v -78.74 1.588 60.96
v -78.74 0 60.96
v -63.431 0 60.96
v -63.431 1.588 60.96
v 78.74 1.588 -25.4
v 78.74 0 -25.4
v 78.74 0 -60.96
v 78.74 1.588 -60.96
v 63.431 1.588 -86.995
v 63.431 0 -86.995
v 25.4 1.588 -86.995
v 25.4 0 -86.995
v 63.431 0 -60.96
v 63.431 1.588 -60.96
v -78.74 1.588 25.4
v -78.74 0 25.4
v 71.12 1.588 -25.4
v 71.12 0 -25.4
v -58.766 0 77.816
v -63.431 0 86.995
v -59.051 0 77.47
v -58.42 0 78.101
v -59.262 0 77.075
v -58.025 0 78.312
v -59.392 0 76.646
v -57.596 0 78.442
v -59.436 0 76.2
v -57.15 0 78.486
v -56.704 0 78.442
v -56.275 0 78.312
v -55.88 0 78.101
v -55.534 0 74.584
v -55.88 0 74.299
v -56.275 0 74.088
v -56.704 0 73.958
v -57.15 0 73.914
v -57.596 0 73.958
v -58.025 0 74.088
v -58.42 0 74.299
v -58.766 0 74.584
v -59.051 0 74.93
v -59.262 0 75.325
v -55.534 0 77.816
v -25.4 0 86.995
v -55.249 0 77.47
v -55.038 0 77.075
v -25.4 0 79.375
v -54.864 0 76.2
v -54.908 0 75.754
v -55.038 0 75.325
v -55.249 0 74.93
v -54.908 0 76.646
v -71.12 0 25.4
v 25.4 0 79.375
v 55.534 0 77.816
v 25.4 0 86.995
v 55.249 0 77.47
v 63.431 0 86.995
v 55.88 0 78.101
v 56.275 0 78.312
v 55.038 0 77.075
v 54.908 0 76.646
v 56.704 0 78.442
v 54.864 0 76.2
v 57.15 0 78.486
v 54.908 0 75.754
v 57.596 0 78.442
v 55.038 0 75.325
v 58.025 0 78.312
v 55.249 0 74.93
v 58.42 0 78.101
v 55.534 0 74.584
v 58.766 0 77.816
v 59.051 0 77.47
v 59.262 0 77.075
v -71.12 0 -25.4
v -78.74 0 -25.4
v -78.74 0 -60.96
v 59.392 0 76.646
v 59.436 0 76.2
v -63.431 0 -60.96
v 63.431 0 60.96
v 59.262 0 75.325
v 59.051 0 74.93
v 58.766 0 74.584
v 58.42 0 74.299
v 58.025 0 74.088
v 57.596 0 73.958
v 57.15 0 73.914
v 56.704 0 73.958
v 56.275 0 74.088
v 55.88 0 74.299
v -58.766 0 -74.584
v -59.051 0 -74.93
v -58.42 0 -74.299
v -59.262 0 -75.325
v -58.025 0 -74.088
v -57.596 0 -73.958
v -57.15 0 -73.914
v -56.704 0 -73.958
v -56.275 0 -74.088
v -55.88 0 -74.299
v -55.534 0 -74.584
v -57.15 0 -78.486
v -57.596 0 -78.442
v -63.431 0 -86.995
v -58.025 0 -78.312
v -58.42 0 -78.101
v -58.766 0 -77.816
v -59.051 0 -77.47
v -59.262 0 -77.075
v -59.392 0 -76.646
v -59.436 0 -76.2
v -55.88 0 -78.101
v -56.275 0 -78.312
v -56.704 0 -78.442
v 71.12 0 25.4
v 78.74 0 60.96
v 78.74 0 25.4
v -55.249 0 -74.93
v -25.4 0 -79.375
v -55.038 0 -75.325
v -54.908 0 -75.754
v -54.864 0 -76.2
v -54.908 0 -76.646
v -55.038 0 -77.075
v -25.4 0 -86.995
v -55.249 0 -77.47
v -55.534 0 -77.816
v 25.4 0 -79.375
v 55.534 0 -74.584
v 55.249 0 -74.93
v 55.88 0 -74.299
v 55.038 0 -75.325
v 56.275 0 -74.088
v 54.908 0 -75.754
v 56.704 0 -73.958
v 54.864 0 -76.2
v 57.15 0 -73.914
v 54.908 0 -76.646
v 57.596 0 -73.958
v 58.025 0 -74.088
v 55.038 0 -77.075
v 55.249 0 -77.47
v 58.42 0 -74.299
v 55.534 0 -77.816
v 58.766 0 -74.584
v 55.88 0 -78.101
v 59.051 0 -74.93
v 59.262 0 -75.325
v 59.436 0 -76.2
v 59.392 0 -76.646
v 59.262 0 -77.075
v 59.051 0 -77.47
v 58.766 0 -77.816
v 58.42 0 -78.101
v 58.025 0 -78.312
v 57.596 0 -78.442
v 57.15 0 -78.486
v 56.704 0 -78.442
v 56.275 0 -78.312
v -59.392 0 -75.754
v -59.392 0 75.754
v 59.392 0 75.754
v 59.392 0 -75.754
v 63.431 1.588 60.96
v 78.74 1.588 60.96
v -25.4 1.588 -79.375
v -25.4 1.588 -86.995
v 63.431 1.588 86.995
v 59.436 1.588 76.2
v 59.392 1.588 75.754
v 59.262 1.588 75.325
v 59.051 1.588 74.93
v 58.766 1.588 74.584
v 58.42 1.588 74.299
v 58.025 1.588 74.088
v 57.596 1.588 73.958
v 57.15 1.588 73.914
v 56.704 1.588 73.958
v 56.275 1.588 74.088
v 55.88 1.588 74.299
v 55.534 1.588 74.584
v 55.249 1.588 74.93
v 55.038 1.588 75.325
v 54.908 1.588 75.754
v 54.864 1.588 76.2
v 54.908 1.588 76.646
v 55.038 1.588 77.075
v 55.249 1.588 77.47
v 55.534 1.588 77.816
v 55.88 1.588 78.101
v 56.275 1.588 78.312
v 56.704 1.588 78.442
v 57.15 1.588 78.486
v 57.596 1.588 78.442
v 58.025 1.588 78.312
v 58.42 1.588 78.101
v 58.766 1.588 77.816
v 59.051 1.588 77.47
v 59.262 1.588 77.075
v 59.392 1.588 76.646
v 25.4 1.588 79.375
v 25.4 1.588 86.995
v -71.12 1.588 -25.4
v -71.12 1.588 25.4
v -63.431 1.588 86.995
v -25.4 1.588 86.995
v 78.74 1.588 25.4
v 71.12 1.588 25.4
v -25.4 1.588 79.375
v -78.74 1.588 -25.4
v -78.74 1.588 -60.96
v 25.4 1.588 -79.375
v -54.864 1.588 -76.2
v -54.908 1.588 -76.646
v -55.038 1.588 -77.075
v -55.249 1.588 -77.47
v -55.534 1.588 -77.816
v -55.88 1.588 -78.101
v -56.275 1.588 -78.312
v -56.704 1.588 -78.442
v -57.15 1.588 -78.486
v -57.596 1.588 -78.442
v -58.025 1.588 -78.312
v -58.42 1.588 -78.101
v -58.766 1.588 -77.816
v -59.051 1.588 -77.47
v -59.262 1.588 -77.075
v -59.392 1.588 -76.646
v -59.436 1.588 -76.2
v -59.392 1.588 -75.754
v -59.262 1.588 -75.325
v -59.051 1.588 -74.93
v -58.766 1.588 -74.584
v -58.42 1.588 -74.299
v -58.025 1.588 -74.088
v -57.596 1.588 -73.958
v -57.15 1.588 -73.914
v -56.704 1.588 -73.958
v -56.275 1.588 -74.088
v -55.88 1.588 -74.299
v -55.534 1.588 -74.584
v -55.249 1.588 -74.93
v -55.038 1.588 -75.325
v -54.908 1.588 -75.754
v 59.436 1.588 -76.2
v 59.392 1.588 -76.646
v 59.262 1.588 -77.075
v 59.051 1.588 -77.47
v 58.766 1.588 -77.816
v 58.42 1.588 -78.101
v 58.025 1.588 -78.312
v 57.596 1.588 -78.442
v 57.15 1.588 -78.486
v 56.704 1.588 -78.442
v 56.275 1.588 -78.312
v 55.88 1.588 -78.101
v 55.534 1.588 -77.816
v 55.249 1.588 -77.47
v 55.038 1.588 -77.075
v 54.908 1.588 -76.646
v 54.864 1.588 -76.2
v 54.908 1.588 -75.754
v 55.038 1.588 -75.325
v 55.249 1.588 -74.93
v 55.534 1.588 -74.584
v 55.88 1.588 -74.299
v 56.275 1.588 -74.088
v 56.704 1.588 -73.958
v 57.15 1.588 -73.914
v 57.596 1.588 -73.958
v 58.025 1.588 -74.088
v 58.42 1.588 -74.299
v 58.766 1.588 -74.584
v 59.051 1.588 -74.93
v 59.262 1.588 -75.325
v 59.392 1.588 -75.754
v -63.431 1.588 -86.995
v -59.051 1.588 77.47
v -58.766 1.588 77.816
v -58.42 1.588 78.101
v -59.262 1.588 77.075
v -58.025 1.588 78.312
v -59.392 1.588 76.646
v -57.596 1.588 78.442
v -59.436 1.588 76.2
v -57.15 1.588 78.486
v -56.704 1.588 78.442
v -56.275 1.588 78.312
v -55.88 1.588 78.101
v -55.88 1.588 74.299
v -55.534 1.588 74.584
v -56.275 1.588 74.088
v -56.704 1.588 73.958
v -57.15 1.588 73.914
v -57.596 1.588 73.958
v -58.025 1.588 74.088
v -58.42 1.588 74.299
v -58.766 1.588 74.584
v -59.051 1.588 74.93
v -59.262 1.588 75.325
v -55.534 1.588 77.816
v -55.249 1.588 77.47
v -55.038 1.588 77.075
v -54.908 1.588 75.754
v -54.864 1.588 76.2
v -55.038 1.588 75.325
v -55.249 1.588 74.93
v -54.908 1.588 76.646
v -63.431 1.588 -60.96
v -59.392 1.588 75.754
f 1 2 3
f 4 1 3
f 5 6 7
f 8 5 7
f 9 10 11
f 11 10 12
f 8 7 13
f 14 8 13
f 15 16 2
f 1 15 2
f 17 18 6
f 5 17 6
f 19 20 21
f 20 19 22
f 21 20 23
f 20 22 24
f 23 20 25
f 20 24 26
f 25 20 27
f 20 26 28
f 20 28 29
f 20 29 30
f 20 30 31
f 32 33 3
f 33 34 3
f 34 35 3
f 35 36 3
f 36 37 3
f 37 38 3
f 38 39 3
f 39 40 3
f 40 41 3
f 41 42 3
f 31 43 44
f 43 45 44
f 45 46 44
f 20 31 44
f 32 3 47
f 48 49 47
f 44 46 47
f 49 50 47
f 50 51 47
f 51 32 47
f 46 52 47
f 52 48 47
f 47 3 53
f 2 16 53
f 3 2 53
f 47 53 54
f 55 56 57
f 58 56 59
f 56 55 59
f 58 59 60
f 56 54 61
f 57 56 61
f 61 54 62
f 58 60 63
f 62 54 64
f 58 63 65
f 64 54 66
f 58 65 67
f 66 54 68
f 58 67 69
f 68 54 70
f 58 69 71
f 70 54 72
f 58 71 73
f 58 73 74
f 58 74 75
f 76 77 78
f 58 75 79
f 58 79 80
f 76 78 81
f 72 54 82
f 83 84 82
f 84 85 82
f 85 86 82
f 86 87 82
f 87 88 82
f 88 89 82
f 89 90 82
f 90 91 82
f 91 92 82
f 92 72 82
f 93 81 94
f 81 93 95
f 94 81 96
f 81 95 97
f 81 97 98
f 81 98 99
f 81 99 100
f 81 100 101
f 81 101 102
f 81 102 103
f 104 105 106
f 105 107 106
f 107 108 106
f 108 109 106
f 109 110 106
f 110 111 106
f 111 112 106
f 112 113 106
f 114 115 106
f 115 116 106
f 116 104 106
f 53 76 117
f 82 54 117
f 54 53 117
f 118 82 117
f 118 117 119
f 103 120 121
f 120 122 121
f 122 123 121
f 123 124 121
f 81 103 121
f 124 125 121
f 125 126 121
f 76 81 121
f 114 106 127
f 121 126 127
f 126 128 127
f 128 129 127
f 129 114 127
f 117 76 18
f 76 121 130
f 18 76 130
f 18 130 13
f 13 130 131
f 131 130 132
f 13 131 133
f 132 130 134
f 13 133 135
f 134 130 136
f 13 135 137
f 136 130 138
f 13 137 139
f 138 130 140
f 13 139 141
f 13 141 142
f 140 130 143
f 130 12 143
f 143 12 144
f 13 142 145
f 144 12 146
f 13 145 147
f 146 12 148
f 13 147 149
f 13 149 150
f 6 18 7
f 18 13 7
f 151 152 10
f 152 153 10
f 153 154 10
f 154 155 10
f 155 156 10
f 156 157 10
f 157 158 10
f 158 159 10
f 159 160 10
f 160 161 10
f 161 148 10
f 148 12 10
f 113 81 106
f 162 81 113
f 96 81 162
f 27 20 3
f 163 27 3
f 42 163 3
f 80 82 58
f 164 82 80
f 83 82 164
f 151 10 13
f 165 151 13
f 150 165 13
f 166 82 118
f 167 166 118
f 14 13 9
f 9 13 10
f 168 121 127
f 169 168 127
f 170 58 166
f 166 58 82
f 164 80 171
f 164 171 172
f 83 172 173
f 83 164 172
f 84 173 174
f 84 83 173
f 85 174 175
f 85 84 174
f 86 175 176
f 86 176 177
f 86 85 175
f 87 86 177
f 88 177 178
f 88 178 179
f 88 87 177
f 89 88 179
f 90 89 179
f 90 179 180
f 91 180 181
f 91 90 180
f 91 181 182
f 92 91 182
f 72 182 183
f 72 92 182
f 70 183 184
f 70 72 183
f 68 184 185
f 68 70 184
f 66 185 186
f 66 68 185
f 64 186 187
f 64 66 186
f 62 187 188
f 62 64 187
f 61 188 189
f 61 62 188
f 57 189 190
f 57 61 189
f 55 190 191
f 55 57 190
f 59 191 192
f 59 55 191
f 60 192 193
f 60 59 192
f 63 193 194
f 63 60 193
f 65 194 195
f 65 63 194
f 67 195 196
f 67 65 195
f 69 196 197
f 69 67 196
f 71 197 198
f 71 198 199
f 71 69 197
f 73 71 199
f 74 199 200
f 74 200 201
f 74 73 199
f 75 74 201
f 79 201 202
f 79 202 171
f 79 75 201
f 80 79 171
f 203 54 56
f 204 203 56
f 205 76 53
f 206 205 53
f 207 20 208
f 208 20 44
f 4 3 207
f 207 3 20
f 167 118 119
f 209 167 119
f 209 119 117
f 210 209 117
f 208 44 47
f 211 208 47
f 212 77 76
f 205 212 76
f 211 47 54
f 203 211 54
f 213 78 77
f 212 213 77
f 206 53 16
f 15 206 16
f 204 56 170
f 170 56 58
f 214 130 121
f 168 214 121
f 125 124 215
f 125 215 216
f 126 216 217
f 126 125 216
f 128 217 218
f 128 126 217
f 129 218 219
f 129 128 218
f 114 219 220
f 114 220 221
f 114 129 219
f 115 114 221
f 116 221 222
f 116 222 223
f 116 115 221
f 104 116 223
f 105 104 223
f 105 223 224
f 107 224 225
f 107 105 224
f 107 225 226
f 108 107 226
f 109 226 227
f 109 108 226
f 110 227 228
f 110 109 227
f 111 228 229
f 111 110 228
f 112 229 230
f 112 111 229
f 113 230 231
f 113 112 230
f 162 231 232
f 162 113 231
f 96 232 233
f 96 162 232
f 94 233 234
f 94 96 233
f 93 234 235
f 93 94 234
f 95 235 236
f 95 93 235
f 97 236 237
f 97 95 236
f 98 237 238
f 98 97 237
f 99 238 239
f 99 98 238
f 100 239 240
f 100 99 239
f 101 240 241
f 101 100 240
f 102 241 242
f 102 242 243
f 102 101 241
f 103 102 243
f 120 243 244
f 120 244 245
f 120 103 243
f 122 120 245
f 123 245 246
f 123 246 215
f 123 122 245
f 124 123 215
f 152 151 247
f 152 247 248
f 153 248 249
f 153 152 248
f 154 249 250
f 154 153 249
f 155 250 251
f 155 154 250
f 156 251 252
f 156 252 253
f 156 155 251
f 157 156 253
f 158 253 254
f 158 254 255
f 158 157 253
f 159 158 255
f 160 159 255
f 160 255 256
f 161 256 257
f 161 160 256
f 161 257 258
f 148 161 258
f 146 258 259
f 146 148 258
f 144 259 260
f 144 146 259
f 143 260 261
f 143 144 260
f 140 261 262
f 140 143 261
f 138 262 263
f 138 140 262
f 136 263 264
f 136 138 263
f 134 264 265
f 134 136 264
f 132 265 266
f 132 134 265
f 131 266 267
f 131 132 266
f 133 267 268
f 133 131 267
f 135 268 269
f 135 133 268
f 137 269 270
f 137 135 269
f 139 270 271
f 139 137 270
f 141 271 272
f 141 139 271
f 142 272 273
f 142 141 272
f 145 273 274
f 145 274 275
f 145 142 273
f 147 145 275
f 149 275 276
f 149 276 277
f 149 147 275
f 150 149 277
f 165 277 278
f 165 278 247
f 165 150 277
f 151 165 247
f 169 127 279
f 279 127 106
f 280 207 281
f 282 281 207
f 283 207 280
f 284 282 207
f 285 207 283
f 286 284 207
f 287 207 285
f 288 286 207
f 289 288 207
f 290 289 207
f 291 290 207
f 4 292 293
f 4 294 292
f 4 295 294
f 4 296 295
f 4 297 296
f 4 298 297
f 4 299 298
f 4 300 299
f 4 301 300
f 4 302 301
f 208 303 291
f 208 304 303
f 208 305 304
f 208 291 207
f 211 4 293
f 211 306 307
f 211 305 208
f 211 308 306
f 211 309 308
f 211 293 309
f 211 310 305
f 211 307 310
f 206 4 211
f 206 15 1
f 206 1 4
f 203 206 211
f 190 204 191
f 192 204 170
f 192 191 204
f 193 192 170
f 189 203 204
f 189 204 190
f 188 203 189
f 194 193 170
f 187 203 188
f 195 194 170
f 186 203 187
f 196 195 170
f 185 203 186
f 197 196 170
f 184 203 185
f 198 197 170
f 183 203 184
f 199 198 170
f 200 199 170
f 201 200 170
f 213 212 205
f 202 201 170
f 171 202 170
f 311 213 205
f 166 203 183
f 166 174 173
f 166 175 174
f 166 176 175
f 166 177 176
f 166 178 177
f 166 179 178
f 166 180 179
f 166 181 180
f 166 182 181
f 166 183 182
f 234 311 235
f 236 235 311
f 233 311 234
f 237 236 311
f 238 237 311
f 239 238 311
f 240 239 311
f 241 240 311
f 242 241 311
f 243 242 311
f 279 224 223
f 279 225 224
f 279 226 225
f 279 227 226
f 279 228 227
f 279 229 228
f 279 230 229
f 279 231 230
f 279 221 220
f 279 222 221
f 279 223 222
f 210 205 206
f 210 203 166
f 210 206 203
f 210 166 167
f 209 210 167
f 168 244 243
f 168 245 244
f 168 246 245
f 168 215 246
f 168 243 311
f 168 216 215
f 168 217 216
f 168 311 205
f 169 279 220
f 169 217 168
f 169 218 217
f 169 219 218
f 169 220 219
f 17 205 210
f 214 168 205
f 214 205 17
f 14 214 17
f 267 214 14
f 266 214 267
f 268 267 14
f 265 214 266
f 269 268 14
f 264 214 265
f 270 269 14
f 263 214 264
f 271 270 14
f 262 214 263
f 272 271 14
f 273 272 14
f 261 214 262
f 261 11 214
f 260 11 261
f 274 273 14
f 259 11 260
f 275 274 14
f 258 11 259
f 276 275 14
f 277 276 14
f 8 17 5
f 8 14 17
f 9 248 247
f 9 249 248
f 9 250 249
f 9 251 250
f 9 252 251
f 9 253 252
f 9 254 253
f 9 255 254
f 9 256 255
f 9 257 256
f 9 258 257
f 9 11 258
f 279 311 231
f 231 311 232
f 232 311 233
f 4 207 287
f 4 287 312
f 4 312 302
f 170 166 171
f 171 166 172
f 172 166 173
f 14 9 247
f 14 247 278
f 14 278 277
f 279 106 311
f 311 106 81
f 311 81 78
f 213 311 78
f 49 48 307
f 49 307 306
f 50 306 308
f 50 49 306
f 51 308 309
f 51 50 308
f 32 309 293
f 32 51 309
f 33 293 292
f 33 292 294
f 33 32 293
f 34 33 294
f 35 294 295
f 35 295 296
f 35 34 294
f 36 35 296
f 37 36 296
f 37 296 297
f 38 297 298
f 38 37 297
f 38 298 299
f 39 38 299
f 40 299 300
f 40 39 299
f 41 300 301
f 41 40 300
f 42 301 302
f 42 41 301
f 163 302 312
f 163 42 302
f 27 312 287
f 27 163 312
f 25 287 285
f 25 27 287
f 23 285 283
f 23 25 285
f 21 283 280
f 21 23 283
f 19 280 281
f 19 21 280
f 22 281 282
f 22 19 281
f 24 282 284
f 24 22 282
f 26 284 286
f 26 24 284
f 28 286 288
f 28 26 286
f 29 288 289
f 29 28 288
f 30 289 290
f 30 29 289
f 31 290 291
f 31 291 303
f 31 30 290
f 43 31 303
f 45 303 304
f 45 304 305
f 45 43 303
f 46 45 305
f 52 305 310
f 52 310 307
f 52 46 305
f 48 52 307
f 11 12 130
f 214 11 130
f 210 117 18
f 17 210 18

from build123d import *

# Parameters (mm, degrees)
SKETCH1_R       = 2.286
MAIN_BODY_DEPTH = 1.5875


with BuildPart() as part:
    # Sketch1 → Main Body (new body)
    with BuildSketch(Plane(origin=(0, 0, 0), x_dir=(1, 0, 0), z_dir=(0, 1, 0))):
        Polygon((-25.4, 86.995), (-63.43142, 86.995), (-63.43142, 60.96), (-78.74, 60.96), (-78.74, 25.4), (-71.12, 25.4), (-71.12, -25.4), (-78.74, -25.4), (-78.74, -60.96), (-63.43142, -60.96), (-63.43142, -86.995), (-25.4, -86.995), (-25.4, -79.375), (25.4, -79.375), (25.4, -86.995), (63.43142, -86.995), (63.43142, -60.96), (78.74, -60.96), (78.74, -25.4), (71.12, -25.4), (71.12, 25.4), (78.74, 25.4), (78.74, 60.96), (63.43142, 60.96), (63.43142, 86.995), (25.4, 86.995), (25.4, 79.375), (-25.4, 79.375), align=None)
        with Locations((-57.15, 76.2)):
            Circle(SKETCH1_R, mode=Mode.SUBTRACT)
        with Locations((57.15, 76.2)):
            Circle(SKETCH1_R, mode=Mode.SUBTRACT)
        with Locations((57.15, -76.2)):
            Circle(SKETCH1_R, mode=Mode.SUBTRACT)
        with Locations((-57.15, -76.2)):
            Circle(SKETCH1_R, mode=Mode.SUBTRACT)
    extrude(amount=MAIN_BODY_DEPTH)


solid = part.part
